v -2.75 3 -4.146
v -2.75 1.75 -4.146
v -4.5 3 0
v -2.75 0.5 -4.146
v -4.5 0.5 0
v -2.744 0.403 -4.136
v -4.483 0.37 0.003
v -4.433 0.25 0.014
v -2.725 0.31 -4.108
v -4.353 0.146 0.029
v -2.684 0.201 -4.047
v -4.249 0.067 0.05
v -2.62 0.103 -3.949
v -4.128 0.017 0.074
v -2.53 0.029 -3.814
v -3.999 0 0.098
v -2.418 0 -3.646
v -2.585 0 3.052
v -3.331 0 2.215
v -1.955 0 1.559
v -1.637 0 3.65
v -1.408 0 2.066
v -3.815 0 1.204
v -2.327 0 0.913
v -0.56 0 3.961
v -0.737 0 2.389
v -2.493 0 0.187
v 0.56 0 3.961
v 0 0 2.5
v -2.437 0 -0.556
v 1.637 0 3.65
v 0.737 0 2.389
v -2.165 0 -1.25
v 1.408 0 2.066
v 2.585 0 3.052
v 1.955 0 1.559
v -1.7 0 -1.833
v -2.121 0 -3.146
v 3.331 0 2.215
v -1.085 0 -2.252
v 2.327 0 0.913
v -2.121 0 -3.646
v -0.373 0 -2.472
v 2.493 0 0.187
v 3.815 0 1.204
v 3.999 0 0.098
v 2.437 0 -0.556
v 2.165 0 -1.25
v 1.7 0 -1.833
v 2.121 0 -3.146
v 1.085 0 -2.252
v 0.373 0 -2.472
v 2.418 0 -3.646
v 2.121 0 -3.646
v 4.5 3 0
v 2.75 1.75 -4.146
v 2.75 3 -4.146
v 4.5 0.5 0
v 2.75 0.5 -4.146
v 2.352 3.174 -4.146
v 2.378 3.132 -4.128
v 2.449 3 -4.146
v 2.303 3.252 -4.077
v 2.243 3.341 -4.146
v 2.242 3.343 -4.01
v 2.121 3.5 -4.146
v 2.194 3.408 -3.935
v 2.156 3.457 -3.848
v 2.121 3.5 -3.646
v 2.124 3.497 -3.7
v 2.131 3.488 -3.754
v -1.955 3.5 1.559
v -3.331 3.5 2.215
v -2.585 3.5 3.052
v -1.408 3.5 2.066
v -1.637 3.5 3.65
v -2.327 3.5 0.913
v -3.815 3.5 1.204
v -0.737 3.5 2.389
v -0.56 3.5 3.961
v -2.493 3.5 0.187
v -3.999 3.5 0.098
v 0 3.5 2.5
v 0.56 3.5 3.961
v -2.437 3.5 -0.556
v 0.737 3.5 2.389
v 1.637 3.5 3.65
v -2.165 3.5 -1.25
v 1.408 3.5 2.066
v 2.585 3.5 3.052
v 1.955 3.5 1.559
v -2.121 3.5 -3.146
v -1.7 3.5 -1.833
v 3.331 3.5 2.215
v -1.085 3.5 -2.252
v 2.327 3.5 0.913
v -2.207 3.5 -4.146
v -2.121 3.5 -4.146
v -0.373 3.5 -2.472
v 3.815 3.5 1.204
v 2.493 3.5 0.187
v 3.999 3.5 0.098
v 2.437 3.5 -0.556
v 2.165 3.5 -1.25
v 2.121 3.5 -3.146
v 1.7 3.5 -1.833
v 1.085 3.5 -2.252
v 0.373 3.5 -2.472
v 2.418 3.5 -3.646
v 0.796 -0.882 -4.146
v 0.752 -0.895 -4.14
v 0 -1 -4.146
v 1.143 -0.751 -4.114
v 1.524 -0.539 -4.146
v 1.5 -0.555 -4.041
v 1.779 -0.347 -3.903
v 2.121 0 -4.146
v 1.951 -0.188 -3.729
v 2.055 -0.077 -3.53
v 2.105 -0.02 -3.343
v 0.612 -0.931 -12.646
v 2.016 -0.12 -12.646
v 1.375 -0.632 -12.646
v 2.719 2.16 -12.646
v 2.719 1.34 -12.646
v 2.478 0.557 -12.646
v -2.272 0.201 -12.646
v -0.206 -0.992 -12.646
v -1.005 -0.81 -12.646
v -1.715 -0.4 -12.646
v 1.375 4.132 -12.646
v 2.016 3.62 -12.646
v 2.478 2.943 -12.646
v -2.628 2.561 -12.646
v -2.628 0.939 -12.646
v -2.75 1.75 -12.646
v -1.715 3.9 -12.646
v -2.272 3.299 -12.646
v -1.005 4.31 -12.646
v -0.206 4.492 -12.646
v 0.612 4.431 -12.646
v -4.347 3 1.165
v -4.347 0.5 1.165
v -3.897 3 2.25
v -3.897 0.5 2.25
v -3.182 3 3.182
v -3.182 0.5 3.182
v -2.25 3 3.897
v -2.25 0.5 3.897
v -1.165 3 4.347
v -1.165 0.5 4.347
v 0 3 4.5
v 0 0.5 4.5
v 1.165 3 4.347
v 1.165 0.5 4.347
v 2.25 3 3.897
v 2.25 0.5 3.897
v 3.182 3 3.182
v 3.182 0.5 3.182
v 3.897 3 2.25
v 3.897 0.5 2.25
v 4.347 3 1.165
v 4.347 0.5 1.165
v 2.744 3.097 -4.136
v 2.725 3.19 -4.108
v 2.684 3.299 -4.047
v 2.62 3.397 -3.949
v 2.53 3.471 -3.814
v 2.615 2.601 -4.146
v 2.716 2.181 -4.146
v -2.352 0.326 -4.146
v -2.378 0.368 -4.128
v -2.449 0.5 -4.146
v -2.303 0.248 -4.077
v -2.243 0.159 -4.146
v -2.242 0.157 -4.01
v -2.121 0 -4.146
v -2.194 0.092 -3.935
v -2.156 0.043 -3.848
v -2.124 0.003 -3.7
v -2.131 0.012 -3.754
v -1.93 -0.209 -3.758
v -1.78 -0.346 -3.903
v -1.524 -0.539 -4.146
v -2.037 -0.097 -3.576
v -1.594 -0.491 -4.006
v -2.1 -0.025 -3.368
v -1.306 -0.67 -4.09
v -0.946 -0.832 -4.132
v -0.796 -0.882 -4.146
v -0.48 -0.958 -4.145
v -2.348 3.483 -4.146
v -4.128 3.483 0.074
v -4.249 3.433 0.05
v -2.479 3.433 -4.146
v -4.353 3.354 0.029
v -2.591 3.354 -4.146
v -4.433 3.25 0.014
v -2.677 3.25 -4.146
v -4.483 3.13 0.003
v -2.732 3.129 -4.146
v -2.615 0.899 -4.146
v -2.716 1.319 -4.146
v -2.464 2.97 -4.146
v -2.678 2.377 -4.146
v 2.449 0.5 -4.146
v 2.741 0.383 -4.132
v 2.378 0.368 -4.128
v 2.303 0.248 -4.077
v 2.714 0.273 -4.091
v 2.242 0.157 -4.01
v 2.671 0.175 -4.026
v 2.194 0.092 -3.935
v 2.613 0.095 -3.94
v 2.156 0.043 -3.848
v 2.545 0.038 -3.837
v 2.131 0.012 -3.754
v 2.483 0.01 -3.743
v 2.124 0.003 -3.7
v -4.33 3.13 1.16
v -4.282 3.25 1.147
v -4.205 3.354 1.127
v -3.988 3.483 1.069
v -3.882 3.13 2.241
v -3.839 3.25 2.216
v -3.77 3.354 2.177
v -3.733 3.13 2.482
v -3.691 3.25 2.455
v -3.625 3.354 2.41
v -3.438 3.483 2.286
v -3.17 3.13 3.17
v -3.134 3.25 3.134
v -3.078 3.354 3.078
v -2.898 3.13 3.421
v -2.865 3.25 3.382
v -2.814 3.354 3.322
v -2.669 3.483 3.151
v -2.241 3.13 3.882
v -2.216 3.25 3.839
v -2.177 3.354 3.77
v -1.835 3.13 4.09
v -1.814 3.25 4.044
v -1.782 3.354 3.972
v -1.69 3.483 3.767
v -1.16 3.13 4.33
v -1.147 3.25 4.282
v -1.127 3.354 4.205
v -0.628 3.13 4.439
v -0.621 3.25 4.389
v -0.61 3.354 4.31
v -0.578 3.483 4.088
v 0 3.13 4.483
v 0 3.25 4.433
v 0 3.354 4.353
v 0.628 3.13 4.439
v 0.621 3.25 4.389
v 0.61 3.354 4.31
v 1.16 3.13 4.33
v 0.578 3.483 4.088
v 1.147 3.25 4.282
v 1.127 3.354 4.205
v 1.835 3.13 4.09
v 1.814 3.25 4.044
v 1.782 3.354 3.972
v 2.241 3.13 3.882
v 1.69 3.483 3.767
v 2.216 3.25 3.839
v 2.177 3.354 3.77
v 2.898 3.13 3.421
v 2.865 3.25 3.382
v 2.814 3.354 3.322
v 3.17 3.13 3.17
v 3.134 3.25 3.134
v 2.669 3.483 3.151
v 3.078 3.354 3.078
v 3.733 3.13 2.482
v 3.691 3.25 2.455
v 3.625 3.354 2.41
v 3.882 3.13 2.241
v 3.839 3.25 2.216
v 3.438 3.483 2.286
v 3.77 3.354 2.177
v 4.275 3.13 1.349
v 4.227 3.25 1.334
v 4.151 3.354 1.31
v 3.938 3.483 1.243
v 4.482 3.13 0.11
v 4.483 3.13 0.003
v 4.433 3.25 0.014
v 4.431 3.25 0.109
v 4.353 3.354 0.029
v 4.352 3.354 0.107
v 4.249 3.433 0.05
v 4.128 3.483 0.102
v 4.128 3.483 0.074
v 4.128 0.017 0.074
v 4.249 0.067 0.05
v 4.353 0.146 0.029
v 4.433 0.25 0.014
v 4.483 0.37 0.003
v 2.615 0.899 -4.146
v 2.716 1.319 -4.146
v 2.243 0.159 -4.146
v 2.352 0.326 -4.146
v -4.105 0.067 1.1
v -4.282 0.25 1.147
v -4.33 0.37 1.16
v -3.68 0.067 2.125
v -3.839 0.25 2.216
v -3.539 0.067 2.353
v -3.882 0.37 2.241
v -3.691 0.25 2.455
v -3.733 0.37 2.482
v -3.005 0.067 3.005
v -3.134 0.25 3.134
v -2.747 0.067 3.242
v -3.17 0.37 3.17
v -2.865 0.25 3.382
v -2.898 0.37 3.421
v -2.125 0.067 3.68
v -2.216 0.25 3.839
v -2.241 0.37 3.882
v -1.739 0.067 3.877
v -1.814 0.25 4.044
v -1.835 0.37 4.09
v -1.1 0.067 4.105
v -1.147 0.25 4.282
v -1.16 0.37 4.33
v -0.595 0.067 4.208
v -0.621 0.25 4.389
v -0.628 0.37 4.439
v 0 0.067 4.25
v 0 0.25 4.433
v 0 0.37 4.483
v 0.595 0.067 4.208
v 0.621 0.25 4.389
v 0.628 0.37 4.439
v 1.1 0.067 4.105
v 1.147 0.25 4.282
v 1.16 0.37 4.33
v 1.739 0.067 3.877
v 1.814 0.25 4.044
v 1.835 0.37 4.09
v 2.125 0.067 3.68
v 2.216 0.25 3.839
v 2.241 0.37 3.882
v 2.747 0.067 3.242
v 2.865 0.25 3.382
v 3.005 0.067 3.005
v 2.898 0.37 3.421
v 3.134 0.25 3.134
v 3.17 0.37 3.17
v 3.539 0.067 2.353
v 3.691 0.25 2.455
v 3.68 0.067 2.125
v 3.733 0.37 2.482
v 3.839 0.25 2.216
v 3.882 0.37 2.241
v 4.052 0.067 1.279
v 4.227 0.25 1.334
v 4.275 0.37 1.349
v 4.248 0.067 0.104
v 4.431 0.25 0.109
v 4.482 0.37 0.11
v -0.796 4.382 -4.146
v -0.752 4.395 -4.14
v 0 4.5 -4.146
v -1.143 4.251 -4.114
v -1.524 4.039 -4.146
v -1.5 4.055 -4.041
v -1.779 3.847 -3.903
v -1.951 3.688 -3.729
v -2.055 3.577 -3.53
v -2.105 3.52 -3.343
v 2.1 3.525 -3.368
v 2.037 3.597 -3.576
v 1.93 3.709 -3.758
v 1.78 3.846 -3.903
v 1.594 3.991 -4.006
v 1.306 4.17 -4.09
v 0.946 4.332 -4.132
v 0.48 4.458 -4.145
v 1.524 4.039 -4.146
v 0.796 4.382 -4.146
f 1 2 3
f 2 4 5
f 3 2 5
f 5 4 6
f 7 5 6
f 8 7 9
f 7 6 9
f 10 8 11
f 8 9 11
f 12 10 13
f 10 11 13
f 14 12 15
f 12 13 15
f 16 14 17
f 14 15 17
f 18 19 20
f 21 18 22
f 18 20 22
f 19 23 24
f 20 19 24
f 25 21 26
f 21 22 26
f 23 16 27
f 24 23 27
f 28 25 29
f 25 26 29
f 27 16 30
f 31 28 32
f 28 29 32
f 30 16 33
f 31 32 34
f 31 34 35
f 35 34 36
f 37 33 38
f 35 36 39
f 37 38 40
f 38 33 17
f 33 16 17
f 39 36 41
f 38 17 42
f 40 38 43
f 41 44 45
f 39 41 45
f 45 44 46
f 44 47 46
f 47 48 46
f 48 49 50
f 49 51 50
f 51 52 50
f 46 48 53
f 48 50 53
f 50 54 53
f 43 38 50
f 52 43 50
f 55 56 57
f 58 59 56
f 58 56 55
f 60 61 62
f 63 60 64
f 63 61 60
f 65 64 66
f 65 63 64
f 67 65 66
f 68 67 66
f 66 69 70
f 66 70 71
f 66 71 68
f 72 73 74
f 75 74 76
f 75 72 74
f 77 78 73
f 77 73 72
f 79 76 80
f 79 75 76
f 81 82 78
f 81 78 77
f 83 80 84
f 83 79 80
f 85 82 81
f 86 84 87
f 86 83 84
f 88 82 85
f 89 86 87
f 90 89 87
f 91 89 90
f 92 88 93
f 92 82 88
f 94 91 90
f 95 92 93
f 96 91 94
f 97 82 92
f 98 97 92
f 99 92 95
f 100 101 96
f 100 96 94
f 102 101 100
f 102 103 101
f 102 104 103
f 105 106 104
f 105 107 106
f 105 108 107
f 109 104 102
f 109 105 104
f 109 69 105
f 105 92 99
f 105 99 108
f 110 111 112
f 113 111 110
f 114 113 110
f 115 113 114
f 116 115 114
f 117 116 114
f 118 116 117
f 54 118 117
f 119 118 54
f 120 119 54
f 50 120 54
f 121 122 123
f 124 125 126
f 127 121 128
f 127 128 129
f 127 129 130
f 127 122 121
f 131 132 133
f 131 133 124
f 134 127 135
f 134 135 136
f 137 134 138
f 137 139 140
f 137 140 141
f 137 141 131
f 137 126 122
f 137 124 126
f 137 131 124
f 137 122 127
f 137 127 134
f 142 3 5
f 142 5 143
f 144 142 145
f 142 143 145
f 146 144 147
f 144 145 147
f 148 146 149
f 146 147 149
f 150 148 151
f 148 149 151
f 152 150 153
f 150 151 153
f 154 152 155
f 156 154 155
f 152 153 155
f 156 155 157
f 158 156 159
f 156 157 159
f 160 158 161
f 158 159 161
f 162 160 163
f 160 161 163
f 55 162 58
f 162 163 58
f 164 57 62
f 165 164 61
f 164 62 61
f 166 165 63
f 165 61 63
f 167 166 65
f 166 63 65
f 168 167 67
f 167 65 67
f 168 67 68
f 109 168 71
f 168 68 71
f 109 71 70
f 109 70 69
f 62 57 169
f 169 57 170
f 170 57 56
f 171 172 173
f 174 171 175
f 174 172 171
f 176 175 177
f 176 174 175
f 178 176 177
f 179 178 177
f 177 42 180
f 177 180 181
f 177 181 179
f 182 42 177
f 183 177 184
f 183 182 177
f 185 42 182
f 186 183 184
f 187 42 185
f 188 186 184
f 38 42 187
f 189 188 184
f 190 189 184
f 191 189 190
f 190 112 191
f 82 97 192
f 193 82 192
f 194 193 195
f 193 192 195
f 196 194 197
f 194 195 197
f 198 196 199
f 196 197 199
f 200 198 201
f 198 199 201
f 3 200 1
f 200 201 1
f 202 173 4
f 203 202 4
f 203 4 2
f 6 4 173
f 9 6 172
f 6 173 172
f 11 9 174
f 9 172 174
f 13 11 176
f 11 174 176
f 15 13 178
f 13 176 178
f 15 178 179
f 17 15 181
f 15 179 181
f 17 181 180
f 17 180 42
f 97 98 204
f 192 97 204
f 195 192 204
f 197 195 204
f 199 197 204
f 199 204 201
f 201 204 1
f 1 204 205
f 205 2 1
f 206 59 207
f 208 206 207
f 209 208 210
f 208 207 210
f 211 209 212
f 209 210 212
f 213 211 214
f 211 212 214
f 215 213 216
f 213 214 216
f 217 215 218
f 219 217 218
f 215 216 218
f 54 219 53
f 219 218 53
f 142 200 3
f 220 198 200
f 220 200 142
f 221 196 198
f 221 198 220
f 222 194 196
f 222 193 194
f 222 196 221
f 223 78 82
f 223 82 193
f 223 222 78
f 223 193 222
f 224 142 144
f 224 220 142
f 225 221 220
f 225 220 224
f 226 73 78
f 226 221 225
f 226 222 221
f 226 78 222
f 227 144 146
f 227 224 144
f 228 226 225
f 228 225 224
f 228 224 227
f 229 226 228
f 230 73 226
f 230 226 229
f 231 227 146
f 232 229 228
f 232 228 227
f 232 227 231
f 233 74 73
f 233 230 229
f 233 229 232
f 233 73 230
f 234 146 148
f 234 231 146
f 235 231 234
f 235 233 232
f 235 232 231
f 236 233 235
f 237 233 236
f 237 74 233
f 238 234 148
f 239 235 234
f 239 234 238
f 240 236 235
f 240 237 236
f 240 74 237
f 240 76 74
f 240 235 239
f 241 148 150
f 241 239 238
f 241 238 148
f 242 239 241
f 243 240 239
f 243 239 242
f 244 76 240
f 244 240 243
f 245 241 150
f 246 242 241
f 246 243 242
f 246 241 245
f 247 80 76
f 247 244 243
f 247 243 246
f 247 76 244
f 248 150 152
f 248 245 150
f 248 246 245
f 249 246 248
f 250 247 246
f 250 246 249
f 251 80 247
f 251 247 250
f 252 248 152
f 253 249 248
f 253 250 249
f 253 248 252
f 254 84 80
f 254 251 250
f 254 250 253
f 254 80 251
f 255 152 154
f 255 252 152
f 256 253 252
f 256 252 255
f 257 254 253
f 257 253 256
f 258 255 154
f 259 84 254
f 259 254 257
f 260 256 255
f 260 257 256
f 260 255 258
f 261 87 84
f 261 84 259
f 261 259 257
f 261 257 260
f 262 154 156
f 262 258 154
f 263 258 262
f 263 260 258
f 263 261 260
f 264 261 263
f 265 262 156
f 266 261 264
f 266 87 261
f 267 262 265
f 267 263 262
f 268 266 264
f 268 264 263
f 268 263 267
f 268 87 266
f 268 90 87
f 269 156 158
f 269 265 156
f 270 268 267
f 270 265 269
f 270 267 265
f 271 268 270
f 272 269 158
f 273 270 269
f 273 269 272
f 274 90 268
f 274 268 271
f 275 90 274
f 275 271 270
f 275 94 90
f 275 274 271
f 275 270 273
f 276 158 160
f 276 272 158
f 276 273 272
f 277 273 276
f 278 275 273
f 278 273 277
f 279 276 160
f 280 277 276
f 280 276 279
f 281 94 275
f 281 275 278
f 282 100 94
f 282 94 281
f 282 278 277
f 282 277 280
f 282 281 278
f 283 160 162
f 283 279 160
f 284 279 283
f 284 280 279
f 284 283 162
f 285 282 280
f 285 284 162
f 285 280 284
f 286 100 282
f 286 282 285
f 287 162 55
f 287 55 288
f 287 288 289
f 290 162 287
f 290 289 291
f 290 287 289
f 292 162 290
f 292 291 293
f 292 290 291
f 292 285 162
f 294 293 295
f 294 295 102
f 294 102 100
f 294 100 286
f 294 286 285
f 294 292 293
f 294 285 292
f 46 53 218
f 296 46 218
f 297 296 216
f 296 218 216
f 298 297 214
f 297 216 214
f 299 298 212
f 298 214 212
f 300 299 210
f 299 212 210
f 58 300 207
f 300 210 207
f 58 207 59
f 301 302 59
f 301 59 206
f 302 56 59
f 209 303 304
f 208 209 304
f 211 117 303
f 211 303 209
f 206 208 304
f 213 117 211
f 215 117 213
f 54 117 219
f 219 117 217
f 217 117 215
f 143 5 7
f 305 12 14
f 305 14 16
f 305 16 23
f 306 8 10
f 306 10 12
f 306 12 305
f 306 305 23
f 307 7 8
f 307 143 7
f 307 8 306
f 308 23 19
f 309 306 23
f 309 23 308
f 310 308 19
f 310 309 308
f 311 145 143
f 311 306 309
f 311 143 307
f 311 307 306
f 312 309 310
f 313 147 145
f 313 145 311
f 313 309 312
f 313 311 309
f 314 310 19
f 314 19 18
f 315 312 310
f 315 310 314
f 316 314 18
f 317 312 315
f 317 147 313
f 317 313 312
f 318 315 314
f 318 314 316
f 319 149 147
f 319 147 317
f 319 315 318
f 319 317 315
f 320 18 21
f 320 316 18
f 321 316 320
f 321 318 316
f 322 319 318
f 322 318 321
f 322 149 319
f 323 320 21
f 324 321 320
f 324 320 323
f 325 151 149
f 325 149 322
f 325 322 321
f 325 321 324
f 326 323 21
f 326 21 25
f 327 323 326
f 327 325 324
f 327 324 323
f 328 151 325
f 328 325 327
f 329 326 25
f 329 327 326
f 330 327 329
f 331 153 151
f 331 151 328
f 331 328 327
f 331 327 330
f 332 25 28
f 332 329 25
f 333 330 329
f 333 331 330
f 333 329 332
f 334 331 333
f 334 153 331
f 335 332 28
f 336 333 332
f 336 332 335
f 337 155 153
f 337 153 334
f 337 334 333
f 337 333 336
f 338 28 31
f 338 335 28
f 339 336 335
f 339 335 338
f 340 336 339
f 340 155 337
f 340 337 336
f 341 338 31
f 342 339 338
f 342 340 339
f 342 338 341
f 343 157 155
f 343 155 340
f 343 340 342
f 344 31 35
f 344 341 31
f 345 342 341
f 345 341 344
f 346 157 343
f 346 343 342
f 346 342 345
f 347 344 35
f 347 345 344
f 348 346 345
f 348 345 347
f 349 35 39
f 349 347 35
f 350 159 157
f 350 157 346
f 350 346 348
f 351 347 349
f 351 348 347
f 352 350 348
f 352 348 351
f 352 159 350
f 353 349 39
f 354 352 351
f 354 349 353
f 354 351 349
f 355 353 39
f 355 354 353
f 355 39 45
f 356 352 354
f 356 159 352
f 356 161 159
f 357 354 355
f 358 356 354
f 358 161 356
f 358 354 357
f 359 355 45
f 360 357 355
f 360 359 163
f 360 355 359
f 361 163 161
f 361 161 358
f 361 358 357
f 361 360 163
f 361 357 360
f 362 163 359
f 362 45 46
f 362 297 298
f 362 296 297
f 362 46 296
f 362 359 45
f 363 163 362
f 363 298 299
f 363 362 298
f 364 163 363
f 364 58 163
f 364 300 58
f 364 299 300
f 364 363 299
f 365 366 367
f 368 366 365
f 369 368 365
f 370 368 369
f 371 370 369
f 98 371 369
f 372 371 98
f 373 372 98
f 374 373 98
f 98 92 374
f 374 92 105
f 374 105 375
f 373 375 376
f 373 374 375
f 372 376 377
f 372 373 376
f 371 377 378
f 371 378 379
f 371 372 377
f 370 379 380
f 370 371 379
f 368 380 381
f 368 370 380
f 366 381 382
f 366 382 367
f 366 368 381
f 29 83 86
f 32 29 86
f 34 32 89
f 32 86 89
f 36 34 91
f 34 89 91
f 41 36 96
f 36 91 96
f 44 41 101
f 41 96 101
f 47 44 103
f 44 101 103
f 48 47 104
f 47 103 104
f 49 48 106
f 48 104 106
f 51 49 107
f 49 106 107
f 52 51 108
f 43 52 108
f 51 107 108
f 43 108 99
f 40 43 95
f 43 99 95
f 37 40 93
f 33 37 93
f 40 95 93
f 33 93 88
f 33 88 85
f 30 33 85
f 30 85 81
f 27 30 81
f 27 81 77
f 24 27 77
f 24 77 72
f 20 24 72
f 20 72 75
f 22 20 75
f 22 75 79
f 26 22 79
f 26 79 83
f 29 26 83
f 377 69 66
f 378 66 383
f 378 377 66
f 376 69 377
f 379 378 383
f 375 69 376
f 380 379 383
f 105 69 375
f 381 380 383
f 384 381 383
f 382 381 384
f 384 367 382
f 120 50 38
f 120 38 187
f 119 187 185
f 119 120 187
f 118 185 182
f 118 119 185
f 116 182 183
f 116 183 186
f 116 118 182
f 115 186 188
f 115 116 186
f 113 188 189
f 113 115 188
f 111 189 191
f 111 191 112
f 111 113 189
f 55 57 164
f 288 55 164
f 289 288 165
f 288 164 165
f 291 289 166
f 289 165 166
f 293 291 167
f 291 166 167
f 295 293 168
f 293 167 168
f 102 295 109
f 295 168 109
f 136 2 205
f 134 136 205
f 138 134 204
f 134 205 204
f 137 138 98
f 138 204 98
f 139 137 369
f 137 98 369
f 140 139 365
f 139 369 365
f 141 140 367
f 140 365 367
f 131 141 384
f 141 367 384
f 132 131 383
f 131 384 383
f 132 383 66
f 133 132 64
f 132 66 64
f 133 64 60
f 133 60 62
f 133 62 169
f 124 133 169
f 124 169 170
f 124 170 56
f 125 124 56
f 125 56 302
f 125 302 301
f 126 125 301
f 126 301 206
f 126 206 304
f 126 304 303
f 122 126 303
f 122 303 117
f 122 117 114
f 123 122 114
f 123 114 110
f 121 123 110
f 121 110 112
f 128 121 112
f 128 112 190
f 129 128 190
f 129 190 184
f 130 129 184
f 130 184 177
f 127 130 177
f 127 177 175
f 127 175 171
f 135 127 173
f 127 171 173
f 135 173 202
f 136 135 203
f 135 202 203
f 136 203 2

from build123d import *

# Parameters (mm, degrees)
EXTRUDE_1_DEPTH     = 3.5
SKETCH_2_R          = 2.75
EXTRUDE_2_DEPTH     = 8.5
FILLET_1_R          = 1
FILLET_2_R          = 1
SKETCH_3_R          = 2.5
CUT_EXTRUDE_1_DEPTH = 15.156827953
FILLET_3_R          = 0.5


with BuildPart() as part:
    # ｽｹｯﾁ1 → ﾎﾞｽ - 押し出し1 (new body)
    with BuildSketch(Plane(origin=(0, 0, 0), x_dir=(1, 0, 0), z_dir=(0, 1, 0))):
        Polygon((-4.5, 0), (0, 0), (0, 4.145780988), (-2.75, 4.145780988), align=None)
        with BuildLine():
            Line((4.5, 0), (0, 0))
            Line((0, 0), (-4.5, 0))
            ThreePointArc((-4.5, 0), (0, -4.5), (4.5, 0))
        make_face()
        Polygon((2.75, 4.145780988), (4.5, 0), (0, 0), (0, 4.145780988), align=None)
    extrude(amount=EXTRUDE_1_DEPTH)

    # ｽｹｯﾁ2 → ﾎﾞｽ - 押し出し2 (add)
    with BuildSketch(Plane(origin=(0, 0, -4.145780988), x_dir=(-1, 0, 0), z_dir=(0, 0, -1))):
        with Locations((0, 1.75)):
            Circle(SKETCH_2_R)
    extrude(amount=EXTRUDE_2_DEPTH)

    # ﾌｨﾚｯﾄ1
    # the kernel refuses this fillet: 1 mm, written as the material it adds along each edge
    with BuildSketch(Plane(origin=(4.621320344, 0, -4.145780988), x_dir=(0, 0, 1), z_dir=(-1, 0, 0))) as fillet_1_piece_1_section:
        with BuildLine():
            CenterArc((FILLET_1_R, -FILLET_1_R), FILLET_1_R, 90, 90)
            Line((0, -FILLET_1_R), (0, 0))
            Line((0, 0), (FILLET_1_R, 0))
        make_face()
    fillet_1_piece_1 = extrude(amount=9.242640687, mode=Mode.PRIVATE)
    fillet_1_piece_1 = fillet_1_piece_1 & Plane(origin=(0, 1.75, -3.914317748), x_dir=(-1, 0, 0), z_dir=(0, 0, 1)) * Cylinder(2.75, 23, mode=Mode.PRIVATE)
    add(fillet_1_piece_1)

    # ﾌｨﾚｯﾄ2
    # the kernel refuses this fillet: 1 mm, written as the material it adds along each edge
    with BuildSketch(Plane(origin=(-4.621320344, 3.5, -4.145780988), x_dir=(0, 1, 0), z_dir=(1, 0, 0))) as fillet_2_piece_1_section:
        with BuildLine():
            CenterArc((FILLET_2_R, FILLET_2_R), FILLET_2_R, 180, 90)
            Line((0, FILLET_2_R), (0, 0))
            Line((0, 0), (FILLET_2_R, 0))
        make_face()
    fillet_2_piece_1 = extrude(amount=9.242640687, mode=Mode.PRIVATE)
    fillet_2_piece_1 = fillet_2_piece_1 & Plane(origin=(0, 1.75, -3.91431771), x_dir=(-1, 0, 0), z_dir=(0, 0, 1)) * Cylinder(2.75, 23, mode=Mode.PRIVATE)
    add(fillet_2_piece_1)

    # ｽｹｯﾁ3 → ｶｯﾄ - 押し出し1 (cut, through all)
    with BuildSketch(Plane(origin=(0, 3.5, 0), x_dir=(1, 0, 0), z_dir=(0, 1, 0))):
        with Locations(Location((0, 0, 0), (0, 0, 270))):
            Circle(SKETCH_3_R)
    extrude(amount=-CUT_EXTRUDE_1_DEPTH, mode=Mode.SUBTRACT)

    # ﾌｨﾚｯﾄ3
    # the kernel refuses this fillet: 0.5 mm, written as the material it takes off along each edge
    with BuildSketch(Plane(origin=(-0.871320344, 0, -4.145780988), x_dir=(0, 1, 0), z_dir=(-1, 0, 0))) as fillet_3_piece_1_section:
        with BuildLine():
            CenterArc((FILLET_3_R, -FILLET_3_R), FILLET_3_R, 90, 90)
            Line((0, -FILLET_3_R), (0, 0))
            Line((0, 0), (FILLET_3_R, 0))
        make_face()
    fillet_3_piece_1 = extrude(amount=3.128679656, mode=Mode.PRIVATE)
    fillet_3_piece_1 = fillet_3_piece_1 - Plane(origin=(0, 1.75, -4.02149164), x_dir=(-1, 0, 0), z_dir=(0, 0, 1)) * Cylinder(2.75, 9, mode=Mode.PRIVATE)
    add(fillet_3_piece_1, mode=Mode.SUBTRACT)
    with BuildSketch(Plane(origin=(-2.263888889, 0, -5.297386818), x_dir=(0, 1, 0), z_dir=(-0.3888888888844502, 0, 0.9212846639894848))) as fillet_3_piece_2_section:
        with BuildLine():
            CenterArc((FILLET_3_R, -FILLET_3_R), FILLET_3_R, 90, 90)
            Line((0, -FILLET_3_R), (0, 0))
            Line((0, 0), (FILLET_3_R, 0))
        make_face()
    fillet_3_piece_2 = extrude(amount=7, mode=Mode.PRIVATE)
    fillet_3_piece_2 = split(fillet_3_piece_2, bisect_by=Plane(origin=(-2.809521529, 0.121561121, -4.145780988), z_dir=(0, 0, 1)), keep=Keep.TOP, mode=Mode.PRIVATE)
    add(fillet_3_piece_2, mode=Mode.SUBTRACT)
    with BuildSketch(Plane(origin=(0, 0, 0), x_dir=(-0.9615445935244931, 0, -0.2746488570225942), z_dir=(0.2746488570225942, 0, -0.9615445935244931))) as fillet_3_piece_3:
        with BuildLine():
            CenterArc((4.5 - FILLET_3_R, FILLET_3_R), FILLET_3_R, 270, 90)
            Line((4.5 - FILLET_3_R, 0), (4.5, 0))
            Line((4.5, 0), (4.5, FILLET_3_R))
        make_face()
    revolve(axis=Axis((0, 0, 0), (0, 1, 0)), revolution_arc=211.882178867, mode=Mode.SUBTRACT)
    with BuildSketch(Plane(origin=(2.263888889, 0, -5.297386818), x_dir=(0, 1, 0), z_dir=(0.3888888888844502, 0, 0.9212846639894848))) as fillet_3_piece_4_section:
        with BuildLine():
            CenterArc((FILLET_3_R, FILLET_3_R), FILLET_3_R, 180, 90)
            Line((0, FILLET_3_R), (0, 0))
            Line((0, 0), (FILLET_3_R, 0))
        make_face()
    fillet_3_piece_4 = extrude(amount=7, mode=Mode.PRIVATE)
    fillet_3_piece_4 = split(fillet_3_piece_4, bisect_by=Plane(origin=(2.809522327, 0.121559787, -4.145780988), z_dir=(0, 0, 1)), keep=Keep.TOP, mode=Mode.PRIVATE)
    add(fillet_3_piece_4, mode=Mode.SUBTRACT)
    with BuildSketch(Plane(origin=(4, 0, -4.145780988), x_dir=(0, 1, 0), z_dir=(-1, 0, 0))) as fillet_3_piece_5_section:
        with BuildLine():
            CenterArc((FILLET_3_R, -FILLET_3_R), FILLET_3_R, 90, 90)
            Line((0, -FILLET_3_R), (0, 0))
            Line((0, 0), (FILLET_3_R, 0))
        make_face()
    fillet_3_piece_5 = extrude(amount=3.128679656, mode=Mode.PRIVATE)
    fillet_3_piece_5 = fillet_3_piece_5 - Plane(origin=(0, 1.75, -4.021491718), x_dir=(-1, 0, 0), z_dir=(0, 0, 1)) * Cylinder(2.75, 9, mode=Mode.PRIVATE)
    add(fillet_3_piece_5, mode=Mode.SUBTRACT)
    with BuildSketch(Plane(origin=(0.871320344, 3.5, -4.145780988), x_dir=(0, 0, 1), z_dir=(1, 0, 0))) as fillet_3_piece_6_section:
        with BuildLine():
            CenterArc((FILLET_3_R, FILLET_3_R), FILLET_3_R, 180, 90)
            Line((0, FILLET_3_R), (0, 0))
            Line((0, 0), (FILLET_3_R, 0))
        make_face()
    fillet_3_piece_6 = extrude(amount=3.128679656, mode=Mode.PRIVATE)
    fillet_3_piece_6 = fillet_3_piece_6 - Plane(origin=(0, 1.75, -4.021491695), x_dir=(-1, 0, 0), z_dir=(0, 0, 1)) * Cylinder(2.75, 9, mode=Mode.PRIVATE)
    add(fillet_3_piece_6, mode=Mode.SUBTRACT)
    with BuildSketch(Plane(origin=(-2.263888889, 3.5, -5.297386818), x_dir=(0.9212846639894847, 0, 0.38888888888445017), z_dir=(-0.3888888888844502, 0, 0.9212846639894848))) as fillet_3_piece_7_section:
        with BuildLine():
            CenterArc((FILLET_3_R, -FILLET_3_R), FILLET_3_R, 90, 90)
            Line((0, -FILLET_3_R), (0, 0))
            Line((0, 0), (FILLET_3_R, 0))
        make_face()
    fillet_3_piece_7 = extrude(amount=7, mode=Mode.PRIVATE)
    fillet_3_piece_7 = split(fillet_3_piece_7, bisect_by=Plane(origin=(-2.809521492, 3.378439196, -4.145780988), z_dir=(0, 0, 1)), keep=Keep.TOP, mode=Mode.PRIVATE)
    add(fillet_3_piece_7, mode=Mode.SUBTRACT)
    with BuildSketch(Plane(origin=(0, 3.5, 0), x_dir=(-0.9615445935244931, 0, -0.2746488570225942), z_dir=(0.2746488570225942, 0, -0.9615445935244931))) as fillet_3_piece_8:
        with BuildLine():
            CenterArc((4.5 - FILLET_3_R, -FILLET_3_R), FILLET_3_R, 0, 90)
            Line((4.5, -FILLET_3_R), (4.5, 0))
            Line((4.5, 0), (4.5 - FILLET_3_R, 0))
        make_face()
    revolve(axis=Axis((0, 3.5, 0), (0, 1, 0)), revolution_arc=211.882178867, mode=Mode.SUBTRACT)
    with BuildSketch(Plane(origin=(2.263888889, 3.5, -5.297386818), x_dir=(-0.9212846639894847, 0, 0.38888888888445017), z_dir=(0.3888888888844502, 0, 0.9212846639894848))) as fillet_3_piece_9_section:
        with BuildLine():
            CenterArc((FILLET_3_R, FILLET_3_R), FILLET_3_R, 180, 90)
            Line((0, FILLET_3_R), (0, 0))
            Line((0, 0), (FILLET_3_R, 0))
        make_face()
    fillet_3_piece_9 = extrude(amount=7, mode=Mode.PRIVATE)
    fillet_3_piece_9 = split(fillet_3_piece_9, bisect_by=Plane(origin=(2.80952229, 3.37844053, -4.145780988), z_dir=(0, 0, 1)), keep=Keep.TOP, mode=Mode.PRIVATE)
    add(fillet_3_piece_9, mode=Mode.SUBTRACT)


solid = part.part
